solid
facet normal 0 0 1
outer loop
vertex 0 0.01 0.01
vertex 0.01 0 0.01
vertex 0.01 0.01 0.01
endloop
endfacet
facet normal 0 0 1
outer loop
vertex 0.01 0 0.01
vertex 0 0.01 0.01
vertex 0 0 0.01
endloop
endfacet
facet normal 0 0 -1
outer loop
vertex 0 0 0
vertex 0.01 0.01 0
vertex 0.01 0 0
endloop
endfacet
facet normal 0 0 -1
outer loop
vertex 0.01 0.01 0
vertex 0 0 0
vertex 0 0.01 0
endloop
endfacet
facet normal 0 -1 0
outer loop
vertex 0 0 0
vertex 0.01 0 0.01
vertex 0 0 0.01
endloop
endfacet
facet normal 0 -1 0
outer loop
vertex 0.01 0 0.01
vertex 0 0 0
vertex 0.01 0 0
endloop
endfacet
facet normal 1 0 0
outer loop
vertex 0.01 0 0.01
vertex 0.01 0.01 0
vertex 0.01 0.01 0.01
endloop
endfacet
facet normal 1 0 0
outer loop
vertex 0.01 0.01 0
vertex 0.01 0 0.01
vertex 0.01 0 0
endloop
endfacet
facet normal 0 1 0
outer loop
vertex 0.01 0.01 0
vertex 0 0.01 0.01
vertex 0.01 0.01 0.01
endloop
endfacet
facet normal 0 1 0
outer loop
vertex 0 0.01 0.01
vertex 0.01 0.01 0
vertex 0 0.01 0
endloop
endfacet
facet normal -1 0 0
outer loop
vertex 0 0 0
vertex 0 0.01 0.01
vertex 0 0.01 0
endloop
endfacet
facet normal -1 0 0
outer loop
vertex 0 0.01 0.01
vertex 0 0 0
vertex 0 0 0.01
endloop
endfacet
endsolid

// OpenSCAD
// file: dock.scad
// umote case v6: the charging dock and its swappable contact plates (A: P75 probes + magnets, B: a
// ready-made magnetic connector's other half).

// ---------- dock ----------
// Holds the remote upright on its bottom end, leaning back dock_lean, screen towards the user. Two
// P75-B1 probes stand pogo_proud out of the pocket floor (the remote's end face), so they compress
// that much onto the brass pads; two 10 x 2 magnets face the remote's. Built in remote coordinates.
dock_lean = 15;  pogo_proud = 0.75;  dock_pocket = 16;  dock_g = 0.4;
usbc_bo = [13, 11, 4];              // USB-C breakout board pocket [CHECK]
module remote_to_world() rotate([dock_lean - 90, 0, 0]) translate([0, -L, 0]) children();
module world_to_remote() translate([0, L, 0]) rotate([90 - dock_lean, 0, 0]) children();
module env_grown(g) union() {        // the envelope grown by g (for the pocket)
  slab(-g, bed_ch, e_in(0) - g, e_in(bed_ch) - g); stack(bed_ch, eb, 12, -g); slab(eb, roll_z, -g, -g); stack(roll_z, T, 10, -g); slab(T - 0.01, T + g, e_in(T) - g, e_in(T) - g);
}
// one straight press-fit hole per probe, right through to the wire channel under the floor (a wider
// wire hole below would leave a ledge facing down); glue if the press fit is loose
module pogo_holes() for (sx = [-1, 1]) translate([sx * pad_x, L - 0.5, pad_z]) rotate([-90, 0, 0]) cylinder(d = pogo_d, h = 40, $fn = 24);
module pogo_tips() for (sx = [-1, 1]) translate([sx * pad_x, L - pogo_proud, pad_z]) rotate([-90, 0, 0]) cylinder(d = 0.74, h = pogo_l, $fn = 16);
module dock_raw() difference() {
  world_to_remote() translate([-32, -16, -20]) cube([64, 34, 20 + 12]);
  intersection() { translate([0, 0, 0]) env_grown(dock_g); translate([-50, L - dock_pocket - 30, -20]) cube([100, dock_pocket + 30, 60]); }
  world_to_remote() translate([-usbc_bo[0] / 2, 18 - usbc_bo[1] + 0.01, -20 - 0.01]) cube([usbc_bo[0], usbc_bo[1], usbc_bo[2]]);   // breakout, port at the back
  world_to_remote() translate([-1, -2, -20]) cube([2, 20, usbc_bo[2] - 1]);                                                         // wires under the floor
}
// the dock's half of the contacts is a swappable plate too: a block under the remote's end, its top
// the pocket floor; it drops into the dock from the pocket (press fit, a drop of glue if loose)
dp_t = 6.0;
module dp_region(g = 0) translate([-pp_w / 2 - g, L - 2, pp_z0 - g]) cube([pp_w + 2 * g, 2 + dock_g + dp_t + g, pz0 - 0.05 - pp_z0 + 2 * g]);
module dock() difference() { dock_raw(); dp_region(0.15); pogo_holes(); }
module dock_plate_a() difference() {   // P75 probes onto plate A's pads, 10 x 2 magnets facing plate A's
  intersection() { dock_raw(); dp_region(0); }
  pogo_holes();
  for (sx = [-1, 1]) translate([sx * dmag_x, L - 0.5, dmag_z]) rotate([-90, 0, 0]) cylinder(d = magnet[0] + 0.2, h = magnet[1] + 0.6, $fn = 64);
}
module dock_plate_b() difference() {   // the connector's other half, flush with the pocket floor
  intersection() { dock_raw(); dp_region(0); }
  translate([-conn_b[0] / 2 - 0.15, L - 1, pad_z - conn_b[1] / 2 - 0.15]) cube([conn_b[0] + 0.3, dp_t + 5, conn_b[1] + 0.3]);
  for (sx = [-1, 1]) translate([sx * conn_b[3] / 2, L + dock_g + dp_t + 0.01, pad_z]) rotate([90, 0, 0]) cylinder(d = conn_b[4], h = 4.0, $fn = 24);
}
// file: head_half.scad
// umote case v6: head (screen half) body and face panel, modelled straight (head_xf() bends them).
// No snaps (v5's tip catches broke through the rolled tip wall). The panel is held by 4 M2 from the
// back: through the head floor, the display posts and the display's own corner holes, into bosses
// under the panel; that clamps the display too. Two tenons run from the head's end into the key
// body's rails.

// the hollow inside the head body: straight walls up to roll_z, then following the upper roll
module head_cavity() { intersection() {
  union() {
    translate([0, 0, floor_t]) linear_extrude(roll_z - floor_t + 0.01) plan(wall);
    stack(roll_z, T + 0.01, 8, wall);
  }
  translate([-50, tip_wall, -1]) cube([100, L, 30]);
} }

// ---------- tenons ----------
// In head coordinates. Cross-section (x, z): from the back (z 0, on the bed) up to a 45 deg roof that
// falls from z ten_top at the outer edge to ten_top - (ten_x1 - ten_x0) at the inner one, so the slots
// in the rails print without a flat roof. They run ten_len past the head's end; their roots fill
// the corner inside the head beside and under the display board.
ten_x0 = rail_x;  ten_x1 = 23.4;  ten_top = 8.6;  ten_len = 8.0;
module tenon2d(g = 0) offset(delta = g) polygon([[ten_x0, 0], [ten_x1, 0], [ten_x1, ten_top], [ten_x0, ten_top - (ten_x1 - ten_x0)]]);
// clipped 2.55 inside the outer surface (2.4 of rail outside its slot, which is 0.15 bigger)
module tenon(g = 0, y0 = y_head_end, y1 = y_head_end + ten_len) for (sx = [-1, 1]) tenon_one(sx, g, y0, y1);
module tenon_one(sx, g = 0, y0 = y_head_end, y1 = y_head_end + ten_len) intersection() {
  mirror([sx > 0 ? 0 : 1, 0, 0])
    translate([0, y0 - g, 0]) rotate([-90, 0, 0]) mirror([0, 1, 0]) linear_extrude(y1 - y0 + 2 * g) tenon2d(g);
  union() {
    env_inset(2.55 - g);
    translate([0, 0, -5]) linear_extrude(5.01) plan(e_in(0) + 2.55 - g);   // below the back: it dips into the ridge in key coordinates
  }
}
module tenons_xf(g = 0) head_xf() tenon(g);
// the root inside the head: up to the display PCB's underside beside it, under its back parts inboard
module tenon_root() intersection() {
  for (sx = [-1, 1]) mirror([sx > 0 ? 0 : 1, 0, 0]) translate([0, y_head_end - 8, 0]) rotate([-90, 0, 0]) mirror([0, 1, 0]) linear_extrude(8.01)
    polygon([[ten_x0, 0], [ten_x1 + 1.5, 0], [ten_x1 + 1.5, ten_top], [ten_x0, ten_top - (ten_x1 - ten_x0)]]);   // runs into the side wall
  union() {
    for (sx = [-1, 1]) translate([sx > 0 ? db_w / 2 - 0.5 + 0.3 : -60, -50, 0]) cube([60 - (db_w / 2 - 0.5 + 0.3), 400, db_z0 - 0.3]);   // beside the back parts (|x| > 20.9 + 0.3)
    translate([-50, -50, 0]) cube([100, 400, db_z0 - db_back - 0.3]);              // under them
  }
  translate([-50, -50, 0]) cube([100, 400, db_z0 - 0.3]);
}

// ---------- head body ----------
uz = db_z0 - usb_body_h / 2;
module rrc2d_up(w, h, r, c = -1) let(cc = c < 0 ? r : c) polygon(concat(
  [for (k = [0 : 8]) let(t = 180 + 90 * k / 8) [-w / 2 + r + r * cos(t), -h / 2 + r + r * sin(t)]],
  [for (k = [0 : 8]) let(t = 270 + 90 * k / 8) [w / 2 - r + r * cos(t), -h / 2 + r + r * sin(t)]],
  [[w / 2, h / 2 - cc], [w / 2 - cc, h / 2], [-w / 2 + cc, h / 2], [-w / 2, h / 2 - cc]]));
module rrc2d(w, h, r, flip = false, c = -1) { if (flip) mirror([0, 1]) rrc2d_up(w, h, r, c); else rrc2d_up(w, h, r, c); }
module usb_cuts() {
  ux = usb_floor * tan(usb_flare);
  translate([usb_x, 0, uz]) rotate([-90, 0, 0]) hull() {
    translate([0, 0, -1]) linear_extrude(1) rrc2d(usb_w + 2 * ux, usb_h, usb_r, true, 1.2);
    linear_extrude(usb_floor) rrc2d(usb_w, usb_h, usb_r, true, 1.2);
  }
  translate([usb_x, usb_floor - 0.5, db_z0 - usb_hole[1] / 2]) rotate([-90, 0, 0]) linear_extrude(usb_skin + 2.4) rrc2d(usb_hole[0], usb_hole[1], usb_hole[2], true);
}
module usb_skin_block() translate([usb_x, tip_wall - 0.01, uz]) rotate([-90, 0, 0])
  linear_extrude(max(0.01, usb_floor + usb_skin - tip_wall) + 0.01) rrc2d(usb_w + 2, usb_h + 2, usb_r + 1);
module ir_xf(sx) translate([sx * ir_x, tip_wall, ir_z]) rotate([theta, 0, 0]) translate([0, -tip_wall, 0]) children();
// dome pocket behind a skin, open to the top for the panel's clip; above the LED its front steps back
// with the top roll, so the skin doesn't thin under it
module ir_slot() for (sx = [-1, 1]) ir_xf(sx) hull() {
  translate([0, ir_skin, 0]) rotate([-90, 0, 0]) cylinder(d = 3.15, h = tip_wall + 6, $fn = 32);
  translate([-1.575, ir_skin + e_in(pz0) - e_in(ir_z) + 0.2, 1.575 + 2.5]) cube([3.15, tip_wall + 6, 5]);
}
post_d = 5.2;
module head_posts() for (h = holes) translate([h[0], h[1], floor_t - 0.01]) cylinder(d = post_d, h = db_z0 - floor_t + 0.01, $fn = 40);
// the 4 panel screws: counterbore in the back, clearance up through the post and the PCB
module panel_screw_holes() for (h = holes) translate([h[0], h[1], 0]) m2_csk(db_z0 + 2);
module head_body() { difference() {
  union() {
    difference() { ycut(-1, y_head_end) envelope(); head_cavity(); translate([-60, -10, pz0]) cube([120, L + 20, 20]); }
    intersection() { ycut(-1, y_head_end) translate([0, 0, floor_t]) linear_extrude(T) plan(wall - 0.01);
      union() { usb_skin_block(); head_posts(); } }
    intersection() { ycut(-1, y_head_end + 0.01) translate([0, 0, -1]) linear_extrude(T) plan(wall - 0.01); tenon_root(); }
    tenon();
  }
  usb_cuts(); ir_slot(); panel_screw_holes();
  // pilot holes for the ridge's joint screws: vertical in key coordinates
  head_xf_inv() for (p = s1) translate([p[0], p[1], -6]) { cylinder(d = m2[0], h = 6 + 1.4, $fn = 24);   // 1.2 under the 45 deg roof; drill-point top
    translate([0, 0, 6 + 1.4 - 0.01]) cylinder(d1 = m2[0], d2 = 0, h = m2[0], $fn = 24); }   // 63 deg point: still steeper than 45 after the 8 deg bend
  translate([-in_w / 2 - ir_wire[2], ir_wire[0], eb]) cube([ir_wire[2] + 0.01, ir_wire[1], roll_z - eb]);   // stops at the top roll
} }

// ---------- head face panel ----------
boss_d = 4.0;  boss_hole = 4.5;      // panel bosses down to the display PCB (4.0 clears the LCD); self-tap depth
module ir_clips() for (sx = [-1, 1]) intersection() {
  ir_xf(sx) difference() {
    translate([-2.4, tip_wall - 0.05, -0.6]) cube([4.8, 5.0, 6]);
    translate([0, tip_wall - 1, 0]) rotate([-90, 0, 0]) cylinder(d = 3.1, h = 7, $fn = 32);
    translate([-1.3, tip_wall - 1, -3]) cube([2.6, 7, 3]);
  }
  translate([-50, 0, 0]) cube([100, 50, pz0 + 0.05]);
  union() { translate([0, 0.15, -0.01]) head_cavity(); panel_zone(pcl); }
}
module head_panel() { difference() {
  union() {
    panel_cap(-1, y_head_end - 0.1);
    for (h = holes) translate([h[0], h[1], db_top + 0.05]) cylinder(d = boss_d, h = pz0 - db_top - 0.05 + 0.01, $fn = 40);
    ir_clips();
  }
  for (h = holes) translate([h[0], h[1], db_top]) cylinder(d = m2[0], h = boss_hole, $fn = 24);
  // screen window + 45 deg bezel
  translate([0, win_y0 + win_l / 2, pz0 - 0.5]) linear_extrude(pan_t + 1) rr2d(win_w, win_l, win_r);
  translate([0, win_y0 + win_l / 2, T - win_cham]) hull() {
    linear_extrude(0.01) rr2d(win_w, win_l, win_r);
    translate([0, 0, win_cham + 0.01]) linear_extrude(0.01) rr2d(win_w + 2 * win_cham, win_l + 2 * win_cham, win_r + win_cham);
  }
} }
// file: profile.scad
// umote case v5: the outer form only (plan outline, cross-section, bend). Include after params.scad.

module base2d() { hull() {
  for (sx = [-1, 1]) translate([sx * (W / 2 - tip_r), tip_r]) circle(r = tip_r);
  for (sx = [-1, 1]) translate([sx * (W / 2 - corner_r), L - corner_r]) circle(r = corner_r);
} }
module plan(i = 0) { if (i == 0) base2d(); else offset(r = -i) base2d(); }   // negative i grows it
module rr2d(w, l, r) { offset(r = r) square([w - 2 * r, l - 2 * r], center = true); }

// plan inset of the outer surface at height z: a 45 deg foot, the lower quarter ellipse into the
// flat back, the straight band, then the upper roll round the face panel
function e_in(z) = z < bed_ch ? 1.82 + 0.9 * (bed_ch - z)        // 42 deg, just under the 45 deg limit
  : z < eb ? ea * (1 - sqrt(1 - pow((eb - z) / eb, 2)))
  : z < roll_z ? 0 : roll * pow((z - roll_z) / (T - roll_z), 2);

// one hull between two plan slices; a stack of them follows e_in() (each band is convex)
module slab(z0, z1, i0, i1) { hull() {
  translate([0, 0, z0]) linear_extrude(0.01) plan(i0);
  translate([0, 0, z1 - 0.01]) linear_extrude(0.01) plan(i1);
} }
module stack(z0, z1, n, extra = 0) {
  for (k = [0 : n - 1]) { a = z0 + (z1 - z0) * k / n; b = z0 + (z1 - z0) * (k + 1) / n;
    slab(a, b, e_in(a) + extra, e_in(b) + extra); }
}
module envelope() { union() {
  slab(0, bed_ch, e_in(0), e_in(bed_ch));
  stack(bed_ch, eb, 12);
  slab(eb, roll_z, 0, 0);
  stack(roll_z, T, 10);
} }
// the envelope shrunk by i all round its sides (not top or bottom)
module env_inset(i) union() {
  slab(0, bed_ch, e_in(0) + i, e_in(bed_ch) + i);
  stack(bed_ch, eb, 12, i);
  slab(eb, roll_z, i, i);
  stack(roll_z, T, 10, i);
}
// the face-panel opening: the envelope's roll moved in by the land
module panel_zone(extra = 0) { stack(pz0, T + 0.01, 4, land + extra); }
// a panel: the envelope's top pan_t over y0..y1 (the seam runs along the sides at pz0)
module panel_cap(y0, y1) intersection() { envelope(); translate([-60, y0, pz0]) cube([120, y1 - y0, 10]); }

// the bend: the head turns theta about a transverse axis on the face at the head end, face concave
module head_xf() { translate([0, y_head_end, T]) rotate([-theta, 0, 0]) translate([0, -y_head_end, -T]) children(); }
module ycut(y0, y1) { intersection() { children(); translate([-60, y0, -20]) cube([120, y1 - y0, 60]); } }
// main file
// umote case v6: part dispatcher. Print parts come out in print orientation; asm_* parts are in
// model (assembled) coordinates for the fit check and viewer.
// Render: openscad -D 'part="key_body"' -o key_body.stl case/v6/umote_v6.scad   (or case/v6/export.sh)
part = "params";
$fn = 64;
include <params.scad>
include <profile.scad>
include <head_half.scad>
include <collar.scad>
include <keys.scad>
include <key_half.scad>
include <dock.scad>

// every value the checks need, as one JSON line
P = [["W", W], ["wall", wall], ["tip_wall", tip_wall], ["T", T], ["L", L], ["theta", theta], ["clr", clr],
  ["board_gap", board_gap], ["usb_x", usb_x], ["usb_in", usb_in], ["usb_body_h", usb_body_h], ["usb_floor", usb_floor],
  ["db_w", db_w], ["db_l", db_l], ["db_pcb", db_pcb], ["db_front", db_front], ["db_back", db_back], ["db_y0", db_y0],
  ["db_end", db_end], ["db_top", db_top], ["db_z0", db_z0], ["lcd_from_ant", lcd_from_ant], ["lcd_l", lcd_l],
  ["bb_w", bb_w], ["bb_l", bb_l], ["bb_pcb", bb_pcb], ["bb_y0", bb_y0], ["bb_z0", bb_z0], ["bb_top", bb_top],
  ["sw_body", sw_body], ["sw_total", sw_total], ["smd_h", smd_h], ["top_parts", top_parts],
  ["batt", batt], ["batt_y0", batt_y0], ["batt_z0", batt_z0], ["floor_t", floor_t],
  ["ir_x", ir_x], ["ir_z", ir_z], ["front_in", front_in], ["pan_t", pan_t], ["land", land], ["pcl", pcl],
  ["y_head_end", y_head_end], ["y_key_start", y_key_start], ["cy", cy], ["axle_z", axle_z],
  ["whl_d", whl_d], ["whl_w", whl_w], ["whl_x", whl_x], ["whl_proud", whl_proud], ["whl_gap", whl_gap],
  ["ec11_xf", ec11_xf], ["ec11_h", ec11_h], ["ec11_w", ec11_w], ["ec11_d", ec11_d], ["ec11_bush", ec11_bush], ["ec11_shaft", ec11_shaft],
  ["ec11_nut", ec11_nut], ["carrier", carrier], ["bulk_t", bulk_t],
  ["rail_x", rail_x], ["col_x", col_x], ["col_wall", col_wall], ["cap_z", cap_z], ["ridge_h", ridge_h], ["ridge_in", ridge_in],
  ["s1", s1], ["s2", s2], ["ps", ps], ["m2", m2], ["holes", holes],
  ["ten_x0", ten_x0], ["ten_x1", ten_x1], ["ten_top", ten_top], ["ten_len", ten_len], ["win", win], ["groove_x", groove_x],
  ["min_wall", min_wall], ["min_panel", min_panel], ["min_land", min_land], ["min_skin", min_skin],
  ["magnet", magnet], ["dmag_x", dmag_x], ["dmag_z", dmag_z], ["pad_insert", pad_insert], ["pad_x", pad_x], ["pad_z", pad_z],
  ["pogo_d", pogo_d], ["pogo_l", pogo_l], ["roll_z", roll_z], ["roll", roll], ["pz0", pz0], ["cap_proud", cap_proud],
  ["pp_w", pp_w], ["pp_z0", pp_z0], ["pp_t", pp_t], ["conn_b", conn_b], ["pegs", pegs], ["pad", pad], ["pad_c", pad_c], ["pad_t", pad_t],
  ["hy0", hy0], ["hya", hya], ["hyp", hyp], ["hy1", hy1], ["cap_hole", cap_hole], ["cap_d", cap_d], ["side_clr", side_clr], ["batt_end", batt_end], ["bb_end", bb_end], ["eye", eye]];
function jv(v) = is_list(v) ? str("[", jl(v, 0), "]") : str(v);
function jl(v, i) = i >= len(v) ? "" : str(jv(v[i]), i < len(v) - 1 ? "," : "", jl(v, i + 1));
function jo(p, i) = i >= len(p) ? "" : str("\"", p[i][0], "\":", jv(p[i][1]), i < len(p) - 1 ? "," : "", jo(p, i + 1));

module frame_print() translate([0, 0, T]) mirror([0, 0, 1]) children();      // cap down
module ridge_print() mirror([0, 0, 1]) children();                            // upside down: its flat top on the bed, the hump up
module pp_print() translate([0, 0, -pp_z0]) children();                                    // contact plate: standing on its bottom
module dp_print() translate([0, 0, L + dock_g + dp_t]) rotate([-90, 0, 0]) children();   // dock plate: bottom face down

if (part == "params") { echo(str("PARAMS {", jo(P, 0), "}")); cube(0.01); }
else if (part == "envelope") envelope();
else if (part == "head_body") head_body();
else if (part == "head_panel") translate([0, 0, T]) mirror([0, 0, 1]) head_panel();
else if (part == "asm_head_body") head_xf() head_body();
else if (part == "asm_head_panel") head_xf() head_panel();
else if (part == "frame") frame_print() frame();
else if (part == "asm_frame") frame();
else if (part == "ridge") ridge_print() ridge();
else if (part == "asm_ridge") ridge();
else if (part == "grip_pad") translate([0, 0, ridge_h]) grip_pad();
else if (part == "asm_grip_pad") grip_pad();
else if (part == "pogo_plate_a") pp_print() pogo_plate_a();
else if (part == "pogo_plate_b") pp_print() pogo_plate_b();
else if (part == "asm_pogo_plate_a") pogo_plate_a();
else if (part == "asm_pogo_plate_b") pogo_plate_b();
else if (part == "dock_plate_a") dp_print() dock_plate_a();
else if (part == "dock_plate_b") dp_print() dock_plate_b();
else if (part == "asm_dock_plate_a") dock_plate_a();
else if (part == "asm_dock_plate_b") dock_plate_b();
else if (part == "wheel") translate([0, 0, whl_w / 2]) rotate([0, 90, 0]) wheel();
else if (part == "asm_wheel") wheel_at();
else if (part == "asm_ec11") ec11_model();
else if (part == "asm_nut") ec11_nut_model();
else if (part == "asm_carrier") carrier_model();
else if (part == "key_body") key_body();
else if (part == "asm_key_body") key_body();
else if (part == "key_panel") translate([0, 0, T]) mirror([0, 0, 1]) key_panel();
else if (part == "asm_key_panel") key_panel();
else if (part == "caps") caps_plate();
else if (part == "caps_asm") caps_asm();
else if (part == "caps_asm_pressed") caps_asm(press = 0.3);
else if (part == "caps_asm_rocker_tilt") caps_asm(tip = 0.3);
else if (part == "dpad_ring") translate([0, 0, T + 0.5]) mirror([0, 0, 1]) dpad_ring_at();
else if (part == "asm_dpad_ring") dpad_ring_at();
else if (part == "dock") translate([0, 0, 20]) remote_to_world() dock();
else if (part == "asm_dock") dock();
else if (part == "asm_pogo") pogo_tips();
else if (part == "asm_all") asm_all();
else if (part == "asm_section") difference() { asm_all(); translate([-60, -10, -10]) cube([60 + sec_x, L + 20, 40]); }
else if (part == "t1_wheel_zone") t1();
else if (part == "t2_key_corner") t2();
else if (part == "t3_bottom_end") t3();
else assert(false, str("unknown part ", part));

sec_x = -4;  // asm_section: cut away x < sec_x
module asm_all() {
  color("white") head_xf() head_body();
  color("gray") head_xf() head_panel();
  color("white") key_body();
  color("dimgray") key_panel();
  color("black") frame();
  color("darkslategray") ridge();
  color("dimgray") grip_pad();
  color("gold") pogo_plate_a();
  color("orange") wheel_at();
  color("silver") { ec11_model(); ec11_nut_model(); }
  color("green") carrier_model();
}
module dpad_ring_at() translate(concat(dc, [0])) dpad_ring();

// ---------- test pieces (spec v6 section 7), each in print orientation, side by side ----------
// T1 wheel zone: the head's last 14 mm (with tenons), the key body's wheel zone + 10 mm, the frame,
// the ridge and the wheel. Confirms the EC11 fit, the nut, the wheel's press fit and the joint.
module t1() {
  intersection() { head_body(); translate([-60, y_head_end - 14, -10]) cube([120, 30, 40]); }
  translate([0, -70, 0]) intersection() { key_body(); translate([-60, -10, -10]) cube([120, y_key_start + 10 + 10, 40]); }
  translate([60, -40, 0]) frame_print() frame();
  translate([60, -10, 0]) ridge_print() ridge();
  translate([60, 30, whl_w / 2]) rotate([0, 90, 0]) wheel();
  translate([0, 70, ridge_h]) grip_pad();
}
// T2 key corner: a 40 mm slice of the key body from the wheel zone, and the same slice of the panel
// (tongues, ledge, VOL rocker hole, a round key hole).
module t2() {
  intersection() { key_body(); translate([-60, y_key_start - 2, -10]) cube([120, 42, 40]); }
  translate([60, 0, 0]) intersection() { translate([0, 0, T]) mirror([0, 0, 1]) key_panel(); translate([-60, y_key_start - 3, -10]) cube([120, 43, 40]); }
}
// T3 bottom end: the last 20 mm of the key body (plate slot, eyelet, panel screws), the panel's end and plate A
module t3() {
  translate([-60, 0, 0]) pp_print() pogo_plate_a();
  intersection() { key_body(); translate([-60, L - 20, -10]) cube([120, 30, 40]); }
  translate([60, 0, 0]) intersection() { translate([0, 0, T]) mirror([0, 0, 1]) key_panel(); translate([-60, L - 20, -10]) cube([120, 30, 40]); }
}
